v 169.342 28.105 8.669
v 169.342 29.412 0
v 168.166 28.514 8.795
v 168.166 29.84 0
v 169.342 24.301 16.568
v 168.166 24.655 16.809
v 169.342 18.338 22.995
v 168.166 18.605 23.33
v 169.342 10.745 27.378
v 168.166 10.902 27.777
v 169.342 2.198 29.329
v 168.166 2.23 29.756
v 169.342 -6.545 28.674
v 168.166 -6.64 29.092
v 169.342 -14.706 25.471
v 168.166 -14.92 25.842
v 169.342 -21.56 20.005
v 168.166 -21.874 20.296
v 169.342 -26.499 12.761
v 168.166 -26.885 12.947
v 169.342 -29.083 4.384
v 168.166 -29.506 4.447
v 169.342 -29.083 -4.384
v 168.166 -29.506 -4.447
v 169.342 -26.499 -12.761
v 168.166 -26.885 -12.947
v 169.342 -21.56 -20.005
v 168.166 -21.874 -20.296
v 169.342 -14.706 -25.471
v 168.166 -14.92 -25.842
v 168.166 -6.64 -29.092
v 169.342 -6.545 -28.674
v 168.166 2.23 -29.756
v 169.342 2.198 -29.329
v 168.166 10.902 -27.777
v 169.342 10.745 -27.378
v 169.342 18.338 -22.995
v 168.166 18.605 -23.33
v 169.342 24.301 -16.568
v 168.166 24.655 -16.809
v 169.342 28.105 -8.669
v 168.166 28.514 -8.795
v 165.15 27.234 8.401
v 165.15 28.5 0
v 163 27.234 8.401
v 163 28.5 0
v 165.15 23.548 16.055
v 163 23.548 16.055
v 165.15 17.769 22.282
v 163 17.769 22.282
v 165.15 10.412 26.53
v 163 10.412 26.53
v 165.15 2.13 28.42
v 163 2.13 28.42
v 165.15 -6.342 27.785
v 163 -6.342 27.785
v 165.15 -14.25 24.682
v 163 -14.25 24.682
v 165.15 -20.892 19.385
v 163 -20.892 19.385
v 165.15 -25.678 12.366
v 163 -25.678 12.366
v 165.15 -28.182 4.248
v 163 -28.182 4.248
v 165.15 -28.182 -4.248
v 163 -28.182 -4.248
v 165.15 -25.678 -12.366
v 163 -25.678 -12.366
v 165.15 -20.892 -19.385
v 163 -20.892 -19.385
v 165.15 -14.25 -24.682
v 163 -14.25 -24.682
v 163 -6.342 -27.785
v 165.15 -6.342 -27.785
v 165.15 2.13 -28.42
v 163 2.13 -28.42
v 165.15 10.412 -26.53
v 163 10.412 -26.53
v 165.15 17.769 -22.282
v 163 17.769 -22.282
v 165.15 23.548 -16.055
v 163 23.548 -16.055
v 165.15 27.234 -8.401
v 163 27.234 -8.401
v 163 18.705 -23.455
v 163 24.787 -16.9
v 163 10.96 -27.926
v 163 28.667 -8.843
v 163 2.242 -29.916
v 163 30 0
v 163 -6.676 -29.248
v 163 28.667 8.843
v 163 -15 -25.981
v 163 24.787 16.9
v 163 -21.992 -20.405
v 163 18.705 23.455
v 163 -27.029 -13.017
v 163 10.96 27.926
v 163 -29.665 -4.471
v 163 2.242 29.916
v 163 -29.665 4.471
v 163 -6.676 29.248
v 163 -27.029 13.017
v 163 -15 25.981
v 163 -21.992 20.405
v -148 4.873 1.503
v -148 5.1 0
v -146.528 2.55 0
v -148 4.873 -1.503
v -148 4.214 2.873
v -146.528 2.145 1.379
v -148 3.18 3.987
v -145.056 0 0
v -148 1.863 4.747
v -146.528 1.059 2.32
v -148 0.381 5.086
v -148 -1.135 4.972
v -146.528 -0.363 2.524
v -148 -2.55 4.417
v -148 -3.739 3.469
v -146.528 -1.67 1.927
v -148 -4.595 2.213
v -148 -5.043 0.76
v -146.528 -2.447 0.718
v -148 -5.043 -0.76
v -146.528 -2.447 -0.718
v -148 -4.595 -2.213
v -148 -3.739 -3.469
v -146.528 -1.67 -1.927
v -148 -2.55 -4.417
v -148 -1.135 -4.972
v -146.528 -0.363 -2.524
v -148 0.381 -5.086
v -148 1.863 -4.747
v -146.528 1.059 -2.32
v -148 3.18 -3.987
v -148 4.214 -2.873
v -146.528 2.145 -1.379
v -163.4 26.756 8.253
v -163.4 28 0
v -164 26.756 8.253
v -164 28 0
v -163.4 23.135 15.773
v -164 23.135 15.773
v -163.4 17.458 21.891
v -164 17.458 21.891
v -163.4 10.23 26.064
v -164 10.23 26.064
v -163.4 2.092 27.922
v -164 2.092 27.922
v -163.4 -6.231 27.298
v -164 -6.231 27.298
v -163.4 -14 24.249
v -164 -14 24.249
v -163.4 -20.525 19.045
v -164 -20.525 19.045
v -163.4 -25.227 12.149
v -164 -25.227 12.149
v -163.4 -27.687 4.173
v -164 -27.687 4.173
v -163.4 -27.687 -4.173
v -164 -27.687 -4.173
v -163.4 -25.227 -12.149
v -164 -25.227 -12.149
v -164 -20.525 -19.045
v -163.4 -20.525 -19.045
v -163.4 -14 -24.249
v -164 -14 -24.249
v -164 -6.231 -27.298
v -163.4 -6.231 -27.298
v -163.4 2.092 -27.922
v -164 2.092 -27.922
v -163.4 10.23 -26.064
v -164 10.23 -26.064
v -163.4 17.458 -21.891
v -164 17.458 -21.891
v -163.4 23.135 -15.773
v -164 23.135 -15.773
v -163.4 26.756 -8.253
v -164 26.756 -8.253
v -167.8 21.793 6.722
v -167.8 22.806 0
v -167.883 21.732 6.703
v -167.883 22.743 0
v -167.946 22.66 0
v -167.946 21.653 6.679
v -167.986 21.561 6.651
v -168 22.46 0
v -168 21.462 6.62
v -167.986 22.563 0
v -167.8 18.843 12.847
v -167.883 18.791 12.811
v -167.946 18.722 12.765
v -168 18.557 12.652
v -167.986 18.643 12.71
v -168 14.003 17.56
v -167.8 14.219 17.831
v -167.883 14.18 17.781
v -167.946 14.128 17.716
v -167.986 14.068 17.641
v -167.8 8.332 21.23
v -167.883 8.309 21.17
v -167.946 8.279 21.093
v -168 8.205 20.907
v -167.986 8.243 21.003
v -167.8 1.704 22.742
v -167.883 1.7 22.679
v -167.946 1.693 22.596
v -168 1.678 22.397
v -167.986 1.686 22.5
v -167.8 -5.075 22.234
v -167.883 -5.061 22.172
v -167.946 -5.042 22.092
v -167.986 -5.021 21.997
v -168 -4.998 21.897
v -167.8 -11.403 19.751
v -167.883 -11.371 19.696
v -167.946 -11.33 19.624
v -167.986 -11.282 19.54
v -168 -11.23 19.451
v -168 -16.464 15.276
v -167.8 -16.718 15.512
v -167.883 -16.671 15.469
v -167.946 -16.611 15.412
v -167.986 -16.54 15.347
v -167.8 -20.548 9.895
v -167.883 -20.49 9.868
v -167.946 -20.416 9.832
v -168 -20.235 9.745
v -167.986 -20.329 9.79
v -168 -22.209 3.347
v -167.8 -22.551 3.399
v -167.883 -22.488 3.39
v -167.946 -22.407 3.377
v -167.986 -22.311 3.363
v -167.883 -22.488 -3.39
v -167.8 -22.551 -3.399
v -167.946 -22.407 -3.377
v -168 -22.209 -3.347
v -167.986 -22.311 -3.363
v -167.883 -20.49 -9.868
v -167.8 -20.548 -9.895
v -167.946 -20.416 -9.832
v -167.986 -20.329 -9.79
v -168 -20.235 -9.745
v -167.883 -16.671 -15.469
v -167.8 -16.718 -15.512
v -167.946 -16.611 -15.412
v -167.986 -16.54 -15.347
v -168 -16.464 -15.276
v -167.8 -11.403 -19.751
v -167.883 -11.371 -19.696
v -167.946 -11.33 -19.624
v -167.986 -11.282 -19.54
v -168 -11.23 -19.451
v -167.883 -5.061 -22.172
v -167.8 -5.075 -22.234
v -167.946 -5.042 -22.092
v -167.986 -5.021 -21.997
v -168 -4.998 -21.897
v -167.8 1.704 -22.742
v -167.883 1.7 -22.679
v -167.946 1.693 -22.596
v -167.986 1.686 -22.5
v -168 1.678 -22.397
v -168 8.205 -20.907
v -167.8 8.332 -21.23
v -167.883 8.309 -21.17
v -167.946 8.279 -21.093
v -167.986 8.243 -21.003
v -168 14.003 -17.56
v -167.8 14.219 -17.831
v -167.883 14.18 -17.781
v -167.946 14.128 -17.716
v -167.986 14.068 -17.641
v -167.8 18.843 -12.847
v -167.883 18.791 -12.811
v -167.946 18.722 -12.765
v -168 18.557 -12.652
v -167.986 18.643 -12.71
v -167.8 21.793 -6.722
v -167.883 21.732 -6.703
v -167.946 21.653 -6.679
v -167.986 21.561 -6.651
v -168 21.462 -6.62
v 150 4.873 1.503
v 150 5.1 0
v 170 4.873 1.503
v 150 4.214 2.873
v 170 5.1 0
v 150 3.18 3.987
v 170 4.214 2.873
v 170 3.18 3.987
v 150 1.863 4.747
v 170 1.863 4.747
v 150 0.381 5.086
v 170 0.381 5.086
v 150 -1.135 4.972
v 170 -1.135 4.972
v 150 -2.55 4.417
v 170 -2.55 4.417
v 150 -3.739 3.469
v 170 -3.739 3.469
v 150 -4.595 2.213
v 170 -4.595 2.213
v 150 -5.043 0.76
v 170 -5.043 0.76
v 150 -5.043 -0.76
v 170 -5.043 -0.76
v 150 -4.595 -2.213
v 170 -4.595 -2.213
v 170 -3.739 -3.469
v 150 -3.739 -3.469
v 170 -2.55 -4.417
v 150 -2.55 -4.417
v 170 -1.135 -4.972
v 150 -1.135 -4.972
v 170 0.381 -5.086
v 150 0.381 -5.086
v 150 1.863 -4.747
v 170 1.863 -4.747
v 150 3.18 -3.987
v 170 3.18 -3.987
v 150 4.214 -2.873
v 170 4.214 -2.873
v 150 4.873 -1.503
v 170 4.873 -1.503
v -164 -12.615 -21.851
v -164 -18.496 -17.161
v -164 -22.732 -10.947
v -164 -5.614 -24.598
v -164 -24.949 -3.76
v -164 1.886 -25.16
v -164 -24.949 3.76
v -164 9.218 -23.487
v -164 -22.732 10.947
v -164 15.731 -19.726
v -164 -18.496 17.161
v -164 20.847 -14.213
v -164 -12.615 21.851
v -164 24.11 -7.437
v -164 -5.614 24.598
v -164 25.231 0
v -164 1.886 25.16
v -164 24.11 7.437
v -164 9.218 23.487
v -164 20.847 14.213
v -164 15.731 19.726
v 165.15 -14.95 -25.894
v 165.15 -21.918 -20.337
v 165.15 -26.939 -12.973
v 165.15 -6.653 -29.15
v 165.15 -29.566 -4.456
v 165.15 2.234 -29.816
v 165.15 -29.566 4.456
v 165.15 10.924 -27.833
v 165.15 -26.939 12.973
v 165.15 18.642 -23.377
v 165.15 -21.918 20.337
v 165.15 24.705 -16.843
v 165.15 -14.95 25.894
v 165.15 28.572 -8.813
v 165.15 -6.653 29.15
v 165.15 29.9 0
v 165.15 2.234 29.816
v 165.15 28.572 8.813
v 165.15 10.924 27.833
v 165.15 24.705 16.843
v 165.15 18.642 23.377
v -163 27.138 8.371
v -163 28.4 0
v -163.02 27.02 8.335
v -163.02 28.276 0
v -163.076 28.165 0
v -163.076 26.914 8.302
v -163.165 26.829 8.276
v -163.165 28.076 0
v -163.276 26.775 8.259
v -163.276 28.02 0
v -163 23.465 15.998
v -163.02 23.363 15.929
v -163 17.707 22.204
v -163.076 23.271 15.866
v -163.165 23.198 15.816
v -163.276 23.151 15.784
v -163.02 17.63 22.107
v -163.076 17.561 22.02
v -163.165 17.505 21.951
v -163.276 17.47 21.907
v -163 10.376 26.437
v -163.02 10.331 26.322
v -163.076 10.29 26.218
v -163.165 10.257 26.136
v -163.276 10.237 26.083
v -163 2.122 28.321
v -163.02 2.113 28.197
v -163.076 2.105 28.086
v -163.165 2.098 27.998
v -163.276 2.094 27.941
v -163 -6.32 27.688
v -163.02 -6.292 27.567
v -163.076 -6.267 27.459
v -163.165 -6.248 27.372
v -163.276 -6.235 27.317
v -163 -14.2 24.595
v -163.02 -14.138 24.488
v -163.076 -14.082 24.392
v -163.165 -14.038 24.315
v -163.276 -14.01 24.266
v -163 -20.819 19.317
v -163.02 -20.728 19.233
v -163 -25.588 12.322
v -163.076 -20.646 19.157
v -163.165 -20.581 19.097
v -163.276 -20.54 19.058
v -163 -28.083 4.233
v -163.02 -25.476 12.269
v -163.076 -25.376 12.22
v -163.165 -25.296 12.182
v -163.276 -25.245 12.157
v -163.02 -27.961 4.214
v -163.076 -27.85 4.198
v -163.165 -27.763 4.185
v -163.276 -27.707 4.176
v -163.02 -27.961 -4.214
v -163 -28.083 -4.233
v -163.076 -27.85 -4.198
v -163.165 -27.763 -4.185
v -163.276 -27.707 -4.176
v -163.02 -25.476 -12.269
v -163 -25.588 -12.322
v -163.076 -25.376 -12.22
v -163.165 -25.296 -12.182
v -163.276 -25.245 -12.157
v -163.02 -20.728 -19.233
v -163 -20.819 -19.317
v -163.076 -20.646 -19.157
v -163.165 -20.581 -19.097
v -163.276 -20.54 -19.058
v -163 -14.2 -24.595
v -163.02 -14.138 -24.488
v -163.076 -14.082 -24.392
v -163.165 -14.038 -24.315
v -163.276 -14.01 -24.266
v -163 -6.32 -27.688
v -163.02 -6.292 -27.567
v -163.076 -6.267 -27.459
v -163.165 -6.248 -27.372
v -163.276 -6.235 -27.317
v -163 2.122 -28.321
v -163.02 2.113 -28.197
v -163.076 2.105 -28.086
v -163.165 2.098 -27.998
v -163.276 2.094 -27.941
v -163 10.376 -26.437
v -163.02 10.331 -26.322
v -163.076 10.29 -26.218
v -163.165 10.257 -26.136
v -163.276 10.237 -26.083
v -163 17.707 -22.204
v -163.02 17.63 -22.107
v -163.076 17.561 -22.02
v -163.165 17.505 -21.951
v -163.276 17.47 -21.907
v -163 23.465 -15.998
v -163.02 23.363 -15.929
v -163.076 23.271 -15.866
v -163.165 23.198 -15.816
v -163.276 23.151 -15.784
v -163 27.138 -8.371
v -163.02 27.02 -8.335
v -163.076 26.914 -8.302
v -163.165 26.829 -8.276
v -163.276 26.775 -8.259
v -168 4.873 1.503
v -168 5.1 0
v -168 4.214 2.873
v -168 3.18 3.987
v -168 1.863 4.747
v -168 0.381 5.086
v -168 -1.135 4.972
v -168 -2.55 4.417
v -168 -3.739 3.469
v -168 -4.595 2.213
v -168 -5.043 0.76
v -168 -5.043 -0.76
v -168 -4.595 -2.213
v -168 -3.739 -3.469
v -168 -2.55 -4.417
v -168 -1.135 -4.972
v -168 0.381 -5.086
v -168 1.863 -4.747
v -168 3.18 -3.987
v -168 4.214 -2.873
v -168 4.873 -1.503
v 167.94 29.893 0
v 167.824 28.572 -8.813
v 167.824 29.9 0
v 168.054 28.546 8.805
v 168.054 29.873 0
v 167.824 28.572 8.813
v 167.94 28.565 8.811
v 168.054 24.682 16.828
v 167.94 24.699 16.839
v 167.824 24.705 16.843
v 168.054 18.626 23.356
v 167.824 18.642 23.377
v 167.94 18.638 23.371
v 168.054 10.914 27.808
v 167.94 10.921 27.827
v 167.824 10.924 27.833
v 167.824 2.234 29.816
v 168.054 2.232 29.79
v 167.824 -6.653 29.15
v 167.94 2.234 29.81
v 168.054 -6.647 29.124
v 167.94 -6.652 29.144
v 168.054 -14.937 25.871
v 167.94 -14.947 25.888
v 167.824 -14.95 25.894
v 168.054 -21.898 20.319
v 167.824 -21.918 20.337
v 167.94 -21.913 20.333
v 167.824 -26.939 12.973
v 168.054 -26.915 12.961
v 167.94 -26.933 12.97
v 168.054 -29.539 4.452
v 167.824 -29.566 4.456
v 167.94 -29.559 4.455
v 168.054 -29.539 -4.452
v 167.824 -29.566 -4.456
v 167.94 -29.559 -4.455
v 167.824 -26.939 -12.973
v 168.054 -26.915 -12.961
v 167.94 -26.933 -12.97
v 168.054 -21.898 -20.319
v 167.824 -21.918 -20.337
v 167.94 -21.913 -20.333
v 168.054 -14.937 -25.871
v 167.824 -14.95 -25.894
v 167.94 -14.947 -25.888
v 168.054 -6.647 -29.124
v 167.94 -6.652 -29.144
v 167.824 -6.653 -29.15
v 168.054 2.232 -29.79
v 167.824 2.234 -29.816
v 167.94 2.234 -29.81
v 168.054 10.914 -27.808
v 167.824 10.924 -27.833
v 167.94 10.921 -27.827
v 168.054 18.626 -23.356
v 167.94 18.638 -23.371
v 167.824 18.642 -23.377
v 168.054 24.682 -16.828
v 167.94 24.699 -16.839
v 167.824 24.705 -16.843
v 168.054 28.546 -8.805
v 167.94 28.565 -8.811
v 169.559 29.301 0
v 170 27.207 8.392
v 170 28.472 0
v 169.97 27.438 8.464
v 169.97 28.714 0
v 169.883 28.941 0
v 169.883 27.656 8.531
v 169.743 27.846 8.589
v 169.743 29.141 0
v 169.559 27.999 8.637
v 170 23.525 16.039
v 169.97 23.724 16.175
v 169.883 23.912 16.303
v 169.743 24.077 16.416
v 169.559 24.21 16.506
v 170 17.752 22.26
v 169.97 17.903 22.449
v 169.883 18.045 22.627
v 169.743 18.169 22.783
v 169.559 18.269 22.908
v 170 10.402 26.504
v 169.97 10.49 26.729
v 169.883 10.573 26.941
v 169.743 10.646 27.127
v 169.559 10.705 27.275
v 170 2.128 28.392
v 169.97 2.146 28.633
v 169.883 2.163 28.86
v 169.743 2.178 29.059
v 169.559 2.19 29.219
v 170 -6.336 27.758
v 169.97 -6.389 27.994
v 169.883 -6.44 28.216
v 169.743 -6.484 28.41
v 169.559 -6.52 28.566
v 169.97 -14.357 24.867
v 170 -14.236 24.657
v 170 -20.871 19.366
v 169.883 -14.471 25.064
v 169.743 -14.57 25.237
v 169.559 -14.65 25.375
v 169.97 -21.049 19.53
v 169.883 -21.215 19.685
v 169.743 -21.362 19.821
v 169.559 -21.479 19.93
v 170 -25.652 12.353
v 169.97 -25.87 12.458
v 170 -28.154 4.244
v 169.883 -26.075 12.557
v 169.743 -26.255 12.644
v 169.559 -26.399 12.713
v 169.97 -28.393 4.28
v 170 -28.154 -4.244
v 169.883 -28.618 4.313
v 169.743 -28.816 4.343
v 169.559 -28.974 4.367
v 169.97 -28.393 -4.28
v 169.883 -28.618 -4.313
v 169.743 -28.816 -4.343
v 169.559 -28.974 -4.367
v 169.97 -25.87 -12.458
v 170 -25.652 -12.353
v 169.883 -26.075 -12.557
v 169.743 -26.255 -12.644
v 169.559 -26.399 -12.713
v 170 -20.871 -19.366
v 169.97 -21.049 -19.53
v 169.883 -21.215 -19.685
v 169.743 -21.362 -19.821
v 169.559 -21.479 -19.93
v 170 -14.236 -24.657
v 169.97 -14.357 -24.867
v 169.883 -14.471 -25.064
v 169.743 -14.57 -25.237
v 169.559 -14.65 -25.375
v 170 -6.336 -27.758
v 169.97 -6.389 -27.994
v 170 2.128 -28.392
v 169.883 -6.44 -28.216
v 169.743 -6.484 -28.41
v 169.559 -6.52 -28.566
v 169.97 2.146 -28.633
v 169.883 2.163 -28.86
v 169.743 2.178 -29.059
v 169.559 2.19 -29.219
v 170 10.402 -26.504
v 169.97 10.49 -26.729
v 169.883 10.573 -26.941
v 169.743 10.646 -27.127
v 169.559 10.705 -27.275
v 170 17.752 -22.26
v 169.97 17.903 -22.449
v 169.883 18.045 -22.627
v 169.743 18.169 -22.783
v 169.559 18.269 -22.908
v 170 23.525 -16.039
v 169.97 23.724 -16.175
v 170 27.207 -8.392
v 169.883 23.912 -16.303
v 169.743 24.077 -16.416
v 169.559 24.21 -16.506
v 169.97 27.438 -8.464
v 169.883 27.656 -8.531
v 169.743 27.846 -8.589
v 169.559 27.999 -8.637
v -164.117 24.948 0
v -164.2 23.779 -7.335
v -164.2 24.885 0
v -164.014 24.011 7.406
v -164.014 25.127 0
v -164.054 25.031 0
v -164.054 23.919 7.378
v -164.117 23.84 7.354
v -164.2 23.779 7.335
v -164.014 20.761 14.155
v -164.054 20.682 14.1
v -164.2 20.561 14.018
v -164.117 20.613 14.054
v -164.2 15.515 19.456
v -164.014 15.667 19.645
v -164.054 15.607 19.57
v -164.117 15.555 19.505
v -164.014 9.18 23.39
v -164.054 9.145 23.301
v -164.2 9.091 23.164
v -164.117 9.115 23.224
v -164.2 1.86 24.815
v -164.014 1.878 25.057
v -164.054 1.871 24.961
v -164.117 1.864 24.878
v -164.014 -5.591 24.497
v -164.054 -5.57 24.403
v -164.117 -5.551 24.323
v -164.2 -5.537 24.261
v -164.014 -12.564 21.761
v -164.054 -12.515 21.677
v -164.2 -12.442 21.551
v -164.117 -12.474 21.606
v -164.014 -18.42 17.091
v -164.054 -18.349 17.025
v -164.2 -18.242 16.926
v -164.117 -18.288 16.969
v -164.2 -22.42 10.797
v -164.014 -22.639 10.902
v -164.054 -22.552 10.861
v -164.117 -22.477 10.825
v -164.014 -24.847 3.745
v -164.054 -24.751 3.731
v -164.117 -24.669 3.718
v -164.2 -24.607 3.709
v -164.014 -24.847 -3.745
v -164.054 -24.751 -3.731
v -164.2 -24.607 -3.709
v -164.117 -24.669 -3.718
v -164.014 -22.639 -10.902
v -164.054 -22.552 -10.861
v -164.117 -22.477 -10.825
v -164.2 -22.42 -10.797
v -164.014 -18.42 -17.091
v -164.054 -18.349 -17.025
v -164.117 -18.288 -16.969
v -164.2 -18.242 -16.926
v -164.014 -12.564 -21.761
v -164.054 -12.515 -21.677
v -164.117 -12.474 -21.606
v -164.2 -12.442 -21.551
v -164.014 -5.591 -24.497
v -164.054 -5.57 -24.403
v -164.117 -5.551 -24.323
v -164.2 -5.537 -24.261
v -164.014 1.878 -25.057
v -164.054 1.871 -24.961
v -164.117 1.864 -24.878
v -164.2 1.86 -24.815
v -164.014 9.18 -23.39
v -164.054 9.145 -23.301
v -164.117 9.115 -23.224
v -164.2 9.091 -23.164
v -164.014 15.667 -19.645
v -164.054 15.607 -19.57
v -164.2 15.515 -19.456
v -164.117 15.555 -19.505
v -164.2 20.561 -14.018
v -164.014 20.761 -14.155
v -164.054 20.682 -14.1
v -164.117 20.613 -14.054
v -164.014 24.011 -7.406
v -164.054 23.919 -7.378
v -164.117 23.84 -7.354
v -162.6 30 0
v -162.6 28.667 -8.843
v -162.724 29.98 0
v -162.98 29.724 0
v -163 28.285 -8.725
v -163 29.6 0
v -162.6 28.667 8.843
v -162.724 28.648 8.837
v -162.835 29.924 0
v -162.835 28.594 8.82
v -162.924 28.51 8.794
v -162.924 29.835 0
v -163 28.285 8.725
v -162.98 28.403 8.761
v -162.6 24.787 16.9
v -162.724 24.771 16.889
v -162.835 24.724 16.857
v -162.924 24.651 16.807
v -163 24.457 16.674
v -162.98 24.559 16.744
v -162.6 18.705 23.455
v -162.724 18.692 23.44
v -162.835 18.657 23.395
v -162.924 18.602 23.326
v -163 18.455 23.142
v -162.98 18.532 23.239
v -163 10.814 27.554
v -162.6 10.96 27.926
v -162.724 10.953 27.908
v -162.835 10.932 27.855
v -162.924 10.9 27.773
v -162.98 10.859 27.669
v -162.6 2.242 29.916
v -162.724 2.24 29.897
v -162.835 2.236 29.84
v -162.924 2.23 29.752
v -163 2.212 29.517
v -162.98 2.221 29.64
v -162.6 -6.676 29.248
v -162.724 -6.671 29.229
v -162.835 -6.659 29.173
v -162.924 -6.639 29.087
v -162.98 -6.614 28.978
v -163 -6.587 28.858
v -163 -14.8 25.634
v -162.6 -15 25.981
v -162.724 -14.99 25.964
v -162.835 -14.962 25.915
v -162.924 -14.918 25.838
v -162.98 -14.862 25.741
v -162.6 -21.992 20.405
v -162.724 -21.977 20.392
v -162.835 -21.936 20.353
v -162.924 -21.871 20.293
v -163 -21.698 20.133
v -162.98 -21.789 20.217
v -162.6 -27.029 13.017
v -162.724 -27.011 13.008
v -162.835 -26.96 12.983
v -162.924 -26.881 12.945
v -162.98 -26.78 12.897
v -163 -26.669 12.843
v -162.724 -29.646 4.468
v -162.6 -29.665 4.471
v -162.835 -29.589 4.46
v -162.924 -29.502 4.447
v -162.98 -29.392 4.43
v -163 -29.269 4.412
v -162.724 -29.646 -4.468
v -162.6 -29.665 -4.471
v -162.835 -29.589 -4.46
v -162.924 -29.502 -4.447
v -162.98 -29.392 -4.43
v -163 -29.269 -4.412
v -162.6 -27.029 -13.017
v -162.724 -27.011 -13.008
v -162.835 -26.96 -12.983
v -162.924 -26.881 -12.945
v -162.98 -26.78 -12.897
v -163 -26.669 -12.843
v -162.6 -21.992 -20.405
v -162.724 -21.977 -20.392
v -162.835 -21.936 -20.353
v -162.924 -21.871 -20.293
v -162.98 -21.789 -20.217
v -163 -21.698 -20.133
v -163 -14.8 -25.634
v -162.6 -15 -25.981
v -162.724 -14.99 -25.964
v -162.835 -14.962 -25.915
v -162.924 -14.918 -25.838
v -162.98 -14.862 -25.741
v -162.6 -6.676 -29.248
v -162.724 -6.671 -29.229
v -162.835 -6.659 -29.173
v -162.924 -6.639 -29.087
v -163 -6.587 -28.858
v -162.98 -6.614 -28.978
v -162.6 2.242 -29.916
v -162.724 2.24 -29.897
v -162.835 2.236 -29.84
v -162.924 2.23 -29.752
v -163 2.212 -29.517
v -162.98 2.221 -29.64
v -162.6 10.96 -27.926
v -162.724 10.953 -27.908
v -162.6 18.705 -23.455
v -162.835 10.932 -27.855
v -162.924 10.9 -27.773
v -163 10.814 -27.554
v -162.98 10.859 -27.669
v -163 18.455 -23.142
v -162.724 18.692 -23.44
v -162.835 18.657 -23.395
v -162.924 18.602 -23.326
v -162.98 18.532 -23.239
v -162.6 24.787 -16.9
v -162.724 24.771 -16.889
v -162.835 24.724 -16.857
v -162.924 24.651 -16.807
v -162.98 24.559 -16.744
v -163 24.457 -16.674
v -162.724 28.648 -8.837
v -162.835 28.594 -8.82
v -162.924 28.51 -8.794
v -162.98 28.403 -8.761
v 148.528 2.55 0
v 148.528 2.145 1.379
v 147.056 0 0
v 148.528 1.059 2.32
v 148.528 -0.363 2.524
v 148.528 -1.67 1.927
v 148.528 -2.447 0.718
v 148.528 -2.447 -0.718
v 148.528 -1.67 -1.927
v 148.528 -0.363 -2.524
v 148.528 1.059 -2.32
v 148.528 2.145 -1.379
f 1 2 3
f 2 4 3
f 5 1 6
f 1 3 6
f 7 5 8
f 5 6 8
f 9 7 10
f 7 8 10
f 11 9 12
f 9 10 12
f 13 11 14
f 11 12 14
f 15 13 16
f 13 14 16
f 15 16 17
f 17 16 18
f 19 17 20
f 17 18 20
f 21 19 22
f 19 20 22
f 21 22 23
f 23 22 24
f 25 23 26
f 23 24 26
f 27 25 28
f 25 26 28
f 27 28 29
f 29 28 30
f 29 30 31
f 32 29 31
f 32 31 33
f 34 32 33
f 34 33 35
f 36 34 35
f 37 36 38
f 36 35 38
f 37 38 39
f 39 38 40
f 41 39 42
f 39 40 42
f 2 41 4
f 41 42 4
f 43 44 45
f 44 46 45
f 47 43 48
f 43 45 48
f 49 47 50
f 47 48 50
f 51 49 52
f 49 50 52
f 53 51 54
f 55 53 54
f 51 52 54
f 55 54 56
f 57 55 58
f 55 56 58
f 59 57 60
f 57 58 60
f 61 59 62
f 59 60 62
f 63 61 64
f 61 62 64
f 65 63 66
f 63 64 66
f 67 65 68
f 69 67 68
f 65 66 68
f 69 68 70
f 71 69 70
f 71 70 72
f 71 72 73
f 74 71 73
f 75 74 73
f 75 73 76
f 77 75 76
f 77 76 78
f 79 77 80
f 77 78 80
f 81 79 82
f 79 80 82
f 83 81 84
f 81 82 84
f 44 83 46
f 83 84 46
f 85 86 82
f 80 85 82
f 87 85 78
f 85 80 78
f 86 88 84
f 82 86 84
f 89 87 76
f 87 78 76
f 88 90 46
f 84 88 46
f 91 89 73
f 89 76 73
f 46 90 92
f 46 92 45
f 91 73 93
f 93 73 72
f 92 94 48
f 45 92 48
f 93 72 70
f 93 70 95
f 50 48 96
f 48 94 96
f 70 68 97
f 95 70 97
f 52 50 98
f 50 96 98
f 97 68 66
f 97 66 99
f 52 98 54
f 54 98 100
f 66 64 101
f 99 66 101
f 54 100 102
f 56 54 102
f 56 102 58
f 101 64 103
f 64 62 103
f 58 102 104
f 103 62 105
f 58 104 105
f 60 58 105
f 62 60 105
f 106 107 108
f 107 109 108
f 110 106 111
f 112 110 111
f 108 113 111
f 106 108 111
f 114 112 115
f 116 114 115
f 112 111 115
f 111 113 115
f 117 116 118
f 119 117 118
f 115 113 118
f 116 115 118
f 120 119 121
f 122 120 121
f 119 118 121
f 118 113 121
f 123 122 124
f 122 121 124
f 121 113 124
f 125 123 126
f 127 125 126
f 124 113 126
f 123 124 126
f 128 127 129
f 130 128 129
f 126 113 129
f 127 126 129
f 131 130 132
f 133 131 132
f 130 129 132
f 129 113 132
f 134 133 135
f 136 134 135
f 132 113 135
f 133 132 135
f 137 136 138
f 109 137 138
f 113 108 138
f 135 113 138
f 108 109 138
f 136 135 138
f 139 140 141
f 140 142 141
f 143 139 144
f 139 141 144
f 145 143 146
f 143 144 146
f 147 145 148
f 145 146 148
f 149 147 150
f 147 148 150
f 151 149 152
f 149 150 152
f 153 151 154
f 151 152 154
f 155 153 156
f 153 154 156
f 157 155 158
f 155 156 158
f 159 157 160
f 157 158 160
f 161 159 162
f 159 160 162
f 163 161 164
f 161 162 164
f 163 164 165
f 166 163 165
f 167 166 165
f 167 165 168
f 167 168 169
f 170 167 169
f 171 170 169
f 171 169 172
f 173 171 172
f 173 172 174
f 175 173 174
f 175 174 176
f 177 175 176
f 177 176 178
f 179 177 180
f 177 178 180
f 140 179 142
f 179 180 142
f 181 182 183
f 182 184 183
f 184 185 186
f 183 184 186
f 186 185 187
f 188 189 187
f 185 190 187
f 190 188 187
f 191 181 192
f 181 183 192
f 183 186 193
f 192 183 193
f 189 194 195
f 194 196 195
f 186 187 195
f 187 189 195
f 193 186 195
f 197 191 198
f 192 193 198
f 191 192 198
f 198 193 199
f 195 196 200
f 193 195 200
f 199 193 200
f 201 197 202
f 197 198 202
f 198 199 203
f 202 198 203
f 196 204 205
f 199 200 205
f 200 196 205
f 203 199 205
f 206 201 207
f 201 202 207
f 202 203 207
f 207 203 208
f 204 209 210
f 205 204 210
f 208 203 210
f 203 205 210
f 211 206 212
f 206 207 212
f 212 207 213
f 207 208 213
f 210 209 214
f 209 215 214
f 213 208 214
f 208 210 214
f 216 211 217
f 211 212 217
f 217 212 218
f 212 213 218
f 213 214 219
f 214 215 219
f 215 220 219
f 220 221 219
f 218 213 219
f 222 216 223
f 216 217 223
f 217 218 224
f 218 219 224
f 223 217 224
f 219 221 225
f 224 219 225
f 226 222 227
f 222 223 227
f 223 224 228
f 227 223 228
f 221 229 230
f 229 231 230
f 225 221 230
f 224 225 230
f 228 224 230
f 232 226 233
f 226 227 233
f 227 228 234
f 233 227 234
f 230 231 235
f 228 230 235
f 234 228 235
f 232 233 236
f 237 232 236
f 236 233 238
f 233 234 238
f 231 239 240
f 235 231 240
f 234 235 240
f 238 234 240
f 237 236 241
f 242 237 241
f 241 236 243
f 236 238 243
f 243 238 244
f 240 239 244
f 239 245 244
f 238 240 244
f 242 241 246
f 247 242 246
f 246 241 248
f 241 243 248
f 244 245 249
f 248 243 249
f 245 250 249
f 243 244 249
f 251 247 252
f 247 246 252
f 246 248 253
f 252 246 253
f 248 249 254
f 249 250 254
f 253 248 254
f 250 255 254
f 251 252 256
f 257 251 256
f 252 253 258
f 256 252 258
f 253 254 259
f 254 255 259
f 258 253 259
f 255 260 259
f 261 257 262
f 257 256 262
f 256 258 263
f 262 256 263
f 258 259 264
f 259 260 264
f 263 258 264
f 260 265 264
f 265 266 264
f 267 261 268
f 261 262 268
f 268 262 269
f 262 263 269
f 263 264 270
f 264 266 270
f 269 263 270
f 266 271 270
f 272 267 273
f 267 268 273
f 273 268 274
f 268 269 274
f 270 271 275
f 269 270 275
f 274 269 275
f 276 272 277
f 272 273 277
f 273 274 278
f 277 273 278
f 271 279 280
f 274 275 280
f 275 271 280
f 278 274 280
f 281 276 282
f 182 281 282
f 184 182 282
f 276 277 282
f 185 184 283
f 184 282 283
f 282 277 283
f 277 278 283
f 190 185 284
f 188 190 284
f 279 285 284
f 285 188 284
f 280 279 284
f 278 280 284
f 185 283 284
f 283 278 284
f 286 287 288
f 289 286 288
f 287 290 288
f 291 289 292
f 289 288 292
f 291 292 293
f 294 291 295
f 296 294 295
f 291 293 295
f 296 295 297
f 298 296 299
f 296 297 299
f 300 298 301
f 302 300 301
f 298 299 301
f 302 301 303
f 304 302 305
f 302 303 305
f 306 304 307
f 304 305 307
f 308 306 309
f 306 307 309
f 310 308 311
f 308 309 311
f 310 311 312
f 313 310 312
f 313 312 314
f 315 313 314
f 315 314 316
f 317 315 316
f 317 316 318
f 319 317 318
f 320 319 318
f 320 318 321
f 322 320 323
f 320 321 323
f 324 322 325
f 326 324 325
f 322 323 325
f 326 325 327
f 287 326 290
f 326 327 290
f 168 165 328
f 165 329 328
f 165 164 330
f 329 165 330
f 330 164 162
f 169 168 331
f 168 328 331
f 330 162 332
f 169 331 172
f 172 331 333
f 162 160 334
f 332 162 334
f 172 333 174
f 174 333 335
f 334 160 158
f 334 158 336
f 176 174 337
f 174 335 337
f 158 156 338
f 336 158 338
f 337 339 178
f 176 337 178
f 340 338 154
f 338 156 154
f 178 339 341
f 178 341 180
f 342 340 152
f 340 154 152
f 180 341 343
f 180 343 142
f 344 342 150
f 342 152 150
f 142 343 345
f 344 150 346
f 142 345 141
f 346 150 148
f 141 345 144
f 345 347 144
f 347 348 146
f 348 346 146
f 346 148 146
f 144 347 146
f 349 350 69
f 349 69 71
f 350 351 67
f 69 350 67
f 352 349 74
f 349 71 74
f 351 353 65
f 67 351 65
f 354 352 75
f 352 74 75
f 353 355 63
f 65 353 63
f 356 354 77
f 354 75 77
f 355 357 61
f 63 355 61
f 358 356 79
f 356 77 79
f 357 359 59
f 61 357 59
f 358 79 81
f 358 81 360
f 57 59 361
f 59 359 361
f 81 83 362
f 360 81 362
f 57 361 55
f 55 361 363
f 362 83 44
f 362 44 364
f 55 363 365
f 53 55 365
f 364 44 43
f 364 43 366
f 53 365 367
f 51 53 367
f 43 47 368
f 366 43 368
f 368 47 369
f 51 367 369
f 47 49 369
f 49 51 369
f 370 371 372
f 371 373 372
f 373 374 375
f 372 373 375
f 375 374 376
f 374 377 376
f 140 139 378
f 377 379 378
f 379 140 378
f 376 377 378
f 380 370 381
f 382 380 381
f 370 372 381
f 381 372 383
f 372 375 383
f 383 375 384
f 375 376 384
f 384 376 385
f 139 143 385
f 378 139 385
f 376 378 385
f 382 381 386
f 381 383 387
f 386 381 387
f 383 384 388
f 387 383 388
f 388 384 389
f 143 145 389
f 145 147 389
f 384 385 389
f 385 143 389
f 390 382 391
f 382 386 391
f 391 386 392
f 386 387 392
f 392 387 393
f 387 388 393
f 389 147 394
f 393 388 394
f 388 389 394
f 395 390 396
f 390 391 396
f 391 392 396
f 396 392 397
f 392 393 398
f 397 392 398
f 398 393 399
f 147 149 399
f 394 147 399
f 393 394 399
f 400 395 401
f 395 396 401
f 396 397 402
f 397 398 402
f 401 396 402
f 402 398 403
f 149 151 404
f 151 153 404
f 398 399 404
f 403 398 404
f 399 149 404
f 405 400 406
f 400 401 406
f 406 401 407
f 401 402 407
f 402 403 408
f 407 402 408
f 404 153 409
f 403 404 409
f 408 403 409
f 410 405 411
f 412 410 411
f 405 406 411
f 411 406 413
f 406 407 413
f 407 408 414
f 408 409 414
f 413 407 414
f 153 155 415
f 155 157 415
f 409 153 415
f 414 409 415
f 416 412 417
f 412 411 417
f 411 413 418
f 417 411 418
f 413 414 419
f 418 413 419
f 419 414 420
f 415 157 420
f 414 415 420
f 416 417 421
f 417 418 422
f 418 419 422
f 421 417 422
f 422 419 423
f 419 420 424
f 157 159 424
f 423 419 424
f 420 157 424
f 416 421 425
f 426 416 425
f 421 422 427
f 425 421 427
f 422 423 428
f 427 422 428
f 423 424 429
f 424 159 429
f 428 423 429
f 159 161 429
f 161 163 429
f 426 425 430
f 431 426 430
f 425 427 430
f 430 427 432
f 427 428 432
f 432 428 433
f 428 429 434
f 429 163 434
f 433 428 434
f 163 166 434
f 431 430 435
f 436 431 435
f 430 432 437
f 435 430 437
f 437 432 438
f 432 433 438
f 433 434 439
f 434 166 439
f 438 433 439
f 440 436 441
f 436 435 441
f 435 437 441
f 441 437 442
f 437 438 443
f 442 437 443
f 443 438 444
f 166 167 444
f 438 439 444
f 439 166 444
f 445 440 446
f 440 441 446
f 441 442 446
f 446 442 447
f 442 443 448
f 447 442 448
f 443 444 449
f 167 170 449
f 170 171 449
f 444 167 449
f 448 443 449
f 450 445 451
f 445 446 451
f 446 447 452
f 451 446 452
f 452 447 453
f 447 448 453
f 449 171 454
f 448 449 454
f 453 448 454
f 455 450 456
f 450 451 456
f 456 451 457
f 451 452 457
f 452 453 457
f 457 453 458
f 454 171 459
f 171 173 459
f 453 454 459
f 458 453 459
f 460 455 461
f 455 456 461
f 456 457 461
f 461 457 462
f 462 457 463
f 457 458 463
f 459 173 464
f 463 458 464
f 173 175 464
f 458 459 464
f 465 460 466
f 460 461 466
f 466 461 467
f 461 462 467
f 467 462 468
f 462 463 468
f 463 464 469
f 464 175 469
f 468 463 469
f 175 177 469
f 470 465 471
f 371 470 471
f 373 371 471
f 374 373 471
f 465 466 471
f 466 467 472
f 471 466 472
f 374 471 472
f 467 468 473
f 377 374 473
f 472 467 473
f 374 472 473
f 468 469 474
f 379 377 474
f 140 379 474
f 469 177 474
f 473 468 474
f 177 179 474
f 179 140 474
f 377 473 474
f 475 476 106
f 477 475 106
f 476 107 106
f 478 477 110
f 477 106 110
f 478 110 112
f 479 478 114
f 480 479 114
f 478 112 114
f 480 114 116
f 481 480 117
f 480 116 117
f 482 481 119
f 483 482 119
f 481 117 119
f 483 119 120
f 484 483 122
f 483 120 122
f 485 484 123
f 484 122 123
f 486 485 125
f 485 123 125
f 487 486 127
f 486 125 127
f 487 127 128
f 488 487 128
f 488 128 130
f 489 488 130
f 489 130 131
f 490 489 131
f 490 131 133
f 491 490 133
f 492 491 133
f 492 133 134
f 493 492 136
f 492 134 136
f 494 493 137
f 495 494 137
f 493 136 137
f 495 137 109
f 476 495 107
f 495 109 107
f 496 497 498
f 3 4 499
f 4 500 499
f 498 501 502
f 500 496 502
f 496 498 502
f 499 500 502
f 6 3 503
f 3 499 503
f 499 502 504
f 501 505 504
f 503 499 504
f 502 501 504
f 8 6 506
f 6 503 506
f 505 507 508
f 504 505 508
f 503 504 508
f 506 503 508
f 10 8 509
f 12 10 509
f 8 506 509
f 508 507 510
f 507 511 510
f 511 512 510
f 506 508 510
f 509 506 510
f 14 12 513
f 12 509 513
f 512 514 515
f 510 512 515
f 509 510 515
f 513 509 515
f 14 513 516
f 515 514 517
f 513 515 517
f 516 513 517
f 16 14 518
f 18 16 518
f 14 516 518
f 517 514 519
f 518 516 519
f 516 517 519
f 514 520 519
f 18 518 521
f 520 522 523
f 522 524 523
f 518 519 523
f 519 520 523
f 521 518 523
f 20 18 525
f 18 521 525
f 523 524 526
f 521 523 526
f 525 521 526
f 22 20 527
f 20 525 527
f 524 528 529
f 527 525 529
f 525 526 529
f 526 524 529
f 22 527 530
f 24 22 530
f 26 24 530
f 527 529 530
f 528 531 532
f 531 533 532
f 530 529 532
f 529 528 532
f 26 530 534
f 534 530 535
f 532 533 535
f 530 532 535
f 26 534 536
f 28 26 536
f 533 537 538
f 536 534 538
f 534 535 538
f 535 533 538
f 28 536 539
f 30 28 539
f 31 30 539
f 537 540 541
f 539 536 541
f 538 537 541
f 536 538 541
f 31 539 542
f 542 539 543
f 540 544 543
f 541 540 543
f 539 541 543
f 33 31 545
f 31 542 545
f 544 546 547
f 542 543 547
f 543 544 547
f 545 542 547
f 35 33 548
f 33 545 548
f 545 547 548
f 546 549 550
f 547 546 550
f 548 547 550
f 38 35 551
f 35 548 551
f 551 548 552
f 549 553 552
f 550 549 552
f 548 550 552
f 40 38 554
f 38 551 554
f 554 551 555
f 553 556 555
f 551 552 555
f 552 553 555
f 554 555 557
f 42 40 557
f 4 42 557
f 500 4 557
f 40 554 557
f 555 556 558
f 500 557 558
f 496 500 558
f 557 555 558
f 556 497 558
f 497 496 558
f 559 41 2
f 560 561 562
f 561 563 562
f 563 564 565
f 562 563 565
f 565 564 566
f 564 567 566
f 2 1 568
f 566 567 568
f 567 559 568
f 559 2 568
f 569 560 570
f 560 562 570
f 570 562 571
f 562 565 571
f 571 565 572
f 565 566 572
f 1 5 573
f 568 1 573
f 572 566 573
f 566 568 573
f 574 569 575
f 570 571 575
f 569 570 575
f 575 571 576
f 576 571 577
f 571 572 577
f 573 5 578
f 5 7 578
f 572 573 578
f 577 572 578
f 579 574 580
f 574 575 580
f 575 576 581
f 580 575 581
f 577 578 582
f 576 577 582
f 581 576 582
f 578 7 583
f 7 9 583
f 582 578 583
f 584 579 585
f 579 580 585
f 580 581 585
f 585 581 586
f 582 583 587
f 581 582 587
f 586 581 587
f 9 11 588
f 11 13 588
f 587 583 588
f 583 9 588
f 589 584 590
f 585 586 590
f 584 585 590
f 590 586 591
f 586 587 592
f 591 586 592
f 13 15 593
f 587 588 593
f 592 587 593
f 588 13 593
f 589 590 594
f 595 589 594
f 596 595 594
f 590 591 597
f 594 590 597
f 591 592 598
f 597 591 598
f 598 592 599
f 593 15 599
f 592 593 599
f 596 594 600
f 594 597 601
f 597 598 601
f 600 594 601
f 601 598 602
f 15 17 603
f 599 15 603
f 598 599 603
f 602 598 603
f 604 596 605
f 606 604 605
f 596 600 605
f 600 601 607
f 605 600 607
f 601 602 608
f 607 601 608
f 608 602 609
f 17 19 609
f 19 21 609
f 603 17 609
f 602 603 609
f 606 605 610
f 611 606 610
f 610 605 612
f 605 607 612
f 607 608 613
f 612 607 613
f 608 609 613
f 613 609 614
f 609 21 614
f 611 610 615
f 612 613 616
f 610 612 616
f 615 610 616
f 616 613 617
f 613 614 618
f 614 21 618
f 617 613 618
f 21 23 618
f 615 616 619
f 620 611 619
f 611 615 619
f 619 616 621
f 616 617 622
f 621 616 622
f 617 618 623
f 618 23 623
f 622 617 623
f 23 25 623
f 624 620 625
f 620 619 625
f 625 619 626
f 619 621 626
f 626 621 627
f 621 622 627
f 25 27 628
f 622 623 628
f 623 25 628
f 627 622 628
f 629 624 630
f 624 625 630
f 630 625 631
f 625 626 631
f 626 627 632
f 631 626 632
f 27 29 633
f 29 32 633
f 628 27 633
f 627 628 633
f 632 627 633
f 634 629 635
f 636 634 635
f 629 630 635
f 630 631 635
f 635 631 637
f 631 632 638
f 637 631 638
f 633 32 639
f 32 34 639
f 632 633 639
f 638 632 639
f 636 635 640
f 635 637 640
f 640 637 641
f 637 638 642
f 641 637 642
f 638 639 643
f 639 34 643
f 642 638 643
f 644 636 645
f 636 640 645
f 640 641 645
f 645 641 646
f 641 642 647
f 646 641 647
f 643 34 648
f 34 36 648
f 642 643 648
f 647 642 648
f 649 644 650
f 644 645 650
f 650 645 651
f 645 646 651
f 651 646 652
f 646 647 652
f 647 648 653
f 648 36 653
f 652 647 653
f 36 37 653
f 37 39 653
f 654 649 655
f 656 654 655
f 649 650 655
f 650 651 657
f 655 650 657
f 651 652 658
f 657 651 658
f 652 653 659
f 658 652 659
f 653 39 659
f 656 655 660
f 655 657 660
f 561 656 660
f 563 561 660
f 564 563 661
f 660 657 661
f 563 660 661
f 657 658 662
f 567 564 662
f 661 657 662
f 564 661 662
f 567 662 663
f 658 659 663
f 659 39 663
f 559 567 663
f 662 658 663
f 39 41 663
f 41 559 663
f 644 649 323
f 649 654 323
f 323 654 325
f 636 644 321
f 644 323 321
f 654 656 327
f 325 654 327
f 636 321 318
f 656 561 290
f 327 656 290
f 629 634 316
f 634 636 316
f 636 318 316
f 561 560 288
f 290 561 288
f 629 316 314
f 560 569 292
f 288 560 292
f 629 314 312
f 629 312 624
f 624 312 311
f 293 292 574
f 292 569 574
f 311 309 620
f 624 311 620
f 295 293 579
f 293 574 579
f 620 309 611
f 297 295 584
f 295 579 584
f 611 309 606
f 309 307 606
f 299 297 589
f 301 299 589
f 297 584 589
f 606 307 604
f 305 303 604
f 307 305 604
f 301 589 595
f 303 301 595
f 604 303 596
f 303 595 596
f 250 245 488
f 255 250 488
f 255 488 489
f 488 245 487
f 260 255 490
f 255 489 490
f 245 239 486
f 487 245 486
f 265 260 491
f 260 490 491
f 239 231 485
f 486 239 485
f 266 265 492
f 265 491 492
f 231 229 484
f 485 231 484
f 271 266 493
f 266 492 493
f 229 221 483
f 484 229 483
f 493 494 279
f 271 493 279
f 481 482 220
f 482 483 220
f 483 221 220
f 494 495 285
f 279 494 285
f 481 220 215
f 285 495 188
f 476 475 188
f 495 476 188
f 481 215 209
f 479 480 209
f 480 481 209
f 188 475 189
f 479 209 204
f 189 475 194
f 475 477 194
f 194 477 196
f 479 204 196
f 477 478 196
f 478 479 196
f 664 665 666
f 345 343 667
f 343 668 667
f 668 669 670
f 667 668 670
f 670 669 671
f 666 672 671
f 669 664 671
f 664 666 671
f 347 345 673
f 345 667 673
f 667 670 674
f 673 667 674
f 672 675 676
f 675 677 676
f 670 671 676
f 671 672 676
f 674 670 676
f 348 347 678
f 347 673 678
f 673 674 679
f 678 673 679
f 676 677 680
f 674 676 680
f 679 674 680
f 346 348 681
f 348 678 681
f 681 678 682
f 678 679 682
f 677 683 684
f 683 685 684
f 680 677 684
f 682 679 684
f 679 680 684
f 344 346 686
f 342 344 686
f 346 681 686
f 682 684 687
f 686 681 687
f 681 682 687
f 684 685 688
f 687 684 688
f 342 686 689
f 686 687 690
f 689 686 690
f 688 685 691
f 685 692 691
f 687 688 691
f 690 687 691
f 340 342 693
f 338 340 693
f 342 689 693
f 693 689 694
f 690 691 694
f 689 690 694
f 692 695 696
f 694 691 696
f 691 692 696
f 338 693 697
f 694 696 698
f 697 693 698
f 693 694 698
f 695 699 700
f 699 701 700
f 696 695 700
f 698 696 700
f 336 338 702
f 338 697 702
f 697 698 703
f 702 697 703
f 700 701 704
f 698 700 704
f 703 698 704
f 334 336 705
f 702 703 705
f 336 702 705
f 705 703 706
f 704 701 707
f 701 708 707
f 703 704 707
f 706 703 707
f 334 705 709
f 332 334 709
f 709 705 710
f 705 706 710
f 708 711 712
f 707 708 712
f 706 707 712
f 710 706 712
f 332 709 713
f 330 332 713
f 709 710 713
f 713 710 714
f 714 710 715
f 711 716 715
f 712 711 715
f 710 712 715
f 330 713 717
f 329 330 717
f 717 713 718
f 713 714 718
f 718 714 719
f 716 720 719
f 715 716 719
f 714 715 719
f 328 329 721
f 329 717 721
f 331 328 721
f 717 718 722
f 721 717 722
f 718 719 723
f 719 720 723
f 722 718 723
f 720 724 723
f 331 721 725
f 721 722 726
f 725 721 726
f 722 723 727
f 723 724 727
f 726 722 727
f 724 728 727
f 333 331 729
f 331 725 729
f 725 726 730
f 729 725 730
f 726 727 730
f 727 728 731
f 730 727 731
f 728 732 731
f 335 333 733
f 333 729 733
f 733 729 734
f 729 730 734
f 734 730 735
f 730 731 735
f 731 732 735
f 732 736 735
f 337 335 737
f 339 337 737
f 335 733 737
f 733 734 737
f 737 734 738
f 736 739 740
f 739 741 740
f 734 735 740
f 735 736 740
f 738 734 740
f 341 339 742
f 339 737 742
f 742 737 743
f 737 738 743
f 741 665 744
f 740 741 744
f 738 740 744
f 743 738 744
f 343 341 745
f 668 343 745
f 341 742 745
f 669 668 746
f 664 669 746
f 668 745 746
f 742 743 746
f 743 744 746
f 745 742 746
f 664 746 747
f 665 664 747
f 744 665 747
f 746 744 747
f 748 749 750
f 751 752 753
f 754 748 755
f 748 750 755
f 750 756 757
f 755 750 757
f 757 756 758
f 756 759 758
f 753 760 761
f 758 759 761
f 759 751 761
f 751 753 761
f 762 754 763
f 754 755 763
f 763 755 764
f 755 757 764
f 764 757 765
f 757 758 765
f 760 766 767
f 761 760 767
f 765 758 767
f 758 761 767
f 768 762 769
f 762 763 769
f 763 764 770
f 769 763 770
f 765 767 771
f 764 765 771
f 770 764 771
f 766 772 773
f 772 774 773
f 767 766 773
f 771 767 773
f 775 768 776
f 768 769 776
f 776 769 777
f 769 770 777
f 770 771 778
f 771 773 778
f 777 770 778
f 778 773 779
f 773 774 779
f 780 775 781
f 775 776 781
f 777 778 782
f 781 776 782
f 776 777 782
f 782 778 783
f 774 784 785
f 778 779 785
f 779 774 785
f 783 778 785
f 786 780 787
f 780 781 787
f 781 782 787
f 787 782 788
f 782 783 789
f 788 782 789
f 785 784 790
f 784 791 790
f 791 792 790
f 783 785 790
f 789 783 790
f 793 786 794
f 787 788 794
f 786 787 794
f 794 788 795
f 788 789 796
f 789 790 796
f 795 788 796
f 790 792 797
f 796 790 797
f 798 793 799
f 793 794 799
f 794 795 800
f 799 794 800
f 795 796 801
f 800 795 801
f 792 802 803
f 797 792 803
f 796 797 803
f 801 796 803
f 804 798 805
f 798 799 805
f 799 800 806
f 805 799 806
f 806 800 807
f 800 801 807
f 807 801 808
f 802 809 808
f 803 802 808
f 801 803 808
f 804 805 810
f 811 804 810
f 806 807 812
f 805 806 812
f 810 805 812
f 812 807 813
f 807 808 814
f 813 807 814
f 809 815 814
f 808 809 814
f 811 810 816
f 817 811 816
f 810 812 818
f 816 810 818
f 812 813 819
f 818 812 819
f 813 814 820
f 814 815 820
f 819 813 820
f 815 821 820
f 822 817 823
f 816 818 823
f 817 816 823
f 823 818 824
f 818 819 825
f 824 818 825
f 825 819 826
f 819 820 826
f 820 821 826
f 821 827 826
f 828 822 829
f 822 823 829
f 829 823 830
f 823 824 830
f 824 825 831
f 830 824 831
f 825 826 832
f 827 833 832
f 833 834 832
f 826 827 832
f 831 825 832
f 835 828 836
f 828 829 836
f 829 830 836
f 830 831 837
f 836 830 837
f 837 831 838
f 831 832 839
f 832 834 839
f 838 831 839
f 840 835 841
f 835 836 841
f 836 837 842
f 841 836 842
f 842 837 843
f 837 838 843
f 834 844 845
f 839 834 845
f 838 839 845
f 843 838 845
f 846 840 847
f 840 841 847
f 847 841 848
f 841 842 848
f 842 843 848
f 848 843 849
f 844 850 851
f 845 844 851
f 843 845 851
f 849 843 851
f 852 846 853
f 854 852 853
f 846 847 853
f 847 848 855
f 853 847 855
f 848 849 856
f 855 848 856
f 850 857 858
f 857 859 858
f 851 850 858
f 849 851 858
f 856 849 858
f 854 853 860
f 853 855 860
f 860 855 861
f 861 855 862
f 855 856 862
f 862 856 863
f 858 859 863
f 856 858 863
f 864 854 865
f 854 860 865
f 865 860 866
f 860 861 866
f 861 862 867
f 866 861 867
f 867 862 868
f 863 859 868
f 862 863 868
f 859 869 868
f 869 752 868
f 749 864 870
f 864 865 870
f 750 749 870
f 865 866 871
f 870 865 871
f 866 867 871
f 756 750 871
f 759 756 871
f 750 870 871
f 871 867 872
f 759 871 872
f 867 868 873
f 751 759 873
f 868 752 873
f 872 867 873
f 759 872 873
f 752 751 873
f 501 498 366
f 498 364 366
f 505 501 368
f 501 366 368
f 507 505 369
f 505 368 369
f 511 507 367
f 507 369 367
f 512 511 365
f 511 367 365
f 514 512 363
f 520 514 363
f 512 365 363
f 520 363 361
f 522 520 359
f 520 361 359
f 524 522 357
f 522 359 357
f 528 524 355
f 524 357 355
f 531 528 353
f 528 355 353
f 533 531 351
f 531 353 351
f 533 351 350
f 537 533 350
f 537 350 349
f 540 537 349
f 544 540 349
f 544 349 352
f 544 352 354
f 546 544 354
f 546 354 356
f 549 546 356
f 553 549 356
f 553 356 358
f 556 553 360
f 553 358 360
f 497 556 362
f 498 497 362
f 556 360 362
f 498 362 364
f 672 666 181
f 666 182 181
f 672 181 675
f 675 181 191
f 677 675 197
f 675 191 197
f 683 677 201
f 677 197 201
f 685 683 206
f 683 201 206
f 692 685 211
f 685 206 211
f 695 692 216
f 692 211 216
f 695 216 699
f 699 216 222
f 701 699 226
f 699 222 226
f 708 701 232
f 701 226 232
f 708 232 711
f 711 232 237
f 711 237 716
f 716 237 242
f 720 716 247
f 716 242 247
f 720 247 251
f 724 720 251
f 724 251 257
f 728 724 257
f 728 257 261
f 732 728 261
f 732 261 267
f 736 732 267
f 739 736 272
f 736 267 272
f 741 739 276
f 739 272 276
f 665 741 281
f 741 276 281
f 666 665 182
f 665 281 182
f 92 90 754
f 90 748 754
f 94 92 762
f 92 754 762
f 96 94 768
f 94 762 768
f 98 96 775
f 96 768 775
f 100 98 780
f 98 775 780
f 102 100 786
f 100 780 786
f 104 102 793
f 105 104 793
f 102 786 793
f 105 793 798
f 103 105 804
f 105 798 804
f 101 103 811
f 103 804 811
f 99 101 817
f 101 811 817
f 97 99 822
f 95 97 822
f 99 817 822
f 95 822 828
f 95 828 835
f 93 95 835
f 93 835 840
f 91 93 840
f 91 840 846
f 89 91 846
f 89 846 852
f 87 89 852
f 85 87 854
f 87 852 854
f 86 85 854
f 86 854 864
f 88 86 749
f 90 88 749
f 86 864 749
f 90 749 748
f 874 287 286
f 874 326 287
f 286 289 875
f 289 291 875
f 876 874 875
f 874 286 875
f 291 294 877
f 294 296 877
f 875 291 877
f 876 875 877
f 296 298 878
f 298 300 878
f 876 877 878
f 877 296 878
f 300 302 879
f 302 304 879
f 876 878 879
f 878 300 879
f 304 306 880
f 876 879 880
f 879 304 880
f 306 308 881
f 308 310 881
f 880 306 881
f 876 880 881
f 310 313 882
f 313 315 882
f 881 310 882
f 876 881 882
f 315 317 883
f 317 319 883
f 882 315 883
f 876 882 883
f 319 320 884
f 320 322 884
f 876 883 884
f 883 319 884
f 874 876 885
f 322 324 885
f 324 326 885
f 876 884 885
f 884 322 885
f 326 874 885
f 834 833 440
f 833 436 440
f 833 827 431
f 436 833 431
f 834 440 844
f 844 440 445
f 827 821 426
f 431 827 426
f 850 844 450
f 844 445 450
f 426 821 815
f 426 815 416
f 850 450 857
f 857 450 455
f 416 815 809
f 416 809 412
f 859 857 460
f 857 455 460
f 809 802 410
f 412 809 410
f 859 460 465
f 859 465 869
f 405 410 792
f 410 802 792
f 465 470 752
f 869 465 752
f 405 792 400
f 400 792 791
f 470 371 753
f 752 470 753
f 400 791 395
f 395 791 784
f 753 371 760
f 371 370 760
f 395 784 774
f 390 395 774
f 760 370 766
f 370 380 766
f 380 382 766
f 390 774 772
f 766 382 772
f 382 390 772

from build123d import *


with BuildPart() as part:
    # Sketch1 → Base-Revolve (revolve)
    with BuildSketch(Plane.XY):
        with BuildLine():
            Line((163, 30), (0, 30))
            Line((0, 30), (-162.6, 30))
            ThreePointArc((-162.6, 30), (-162.882842712, 29.882842712), (-163, 29.6))
            Line((-163, 29.6), (-163, 28.4))
            ThreePointArc((-163, 28.4), (-163.117157288, 28.117157288), (-163.4, 28))
            Line((-163.4, 28), (-164, 28))
            Line((-164, 28), (-164, 25.230940108))
            ThreePointArc((-164, 25.230940108), (-164.053589838, 25.030940108), (-164.2, 24.884529946))
            Line((-164.2, 24.884529946), (-167.8, 22.806068977))
            ThreePointArc((-167.8, 22.806068977), (-167.946410162, 22.659658816), (-168, 22.459658816))
            Line((-168, 22.459658816), (-168, 5.1))
            Line((-168, 5.1), (-148, 5.1))
            Line((-148, 5.1), (-145.055513627, 0))
            Line((-145.055513627, 0), (147.055513627, 0))
            Line((147.055513627, 0), (150, 5.1))
            Line((150, 5.1), (170, 5.1))
            Line((170, 5.1), (170, 28.471851993))
            ThreePointArc((170, 28.471851993), (169.819152044, 29.04542843), (169.342020143, 29.411544614))
            Line((169.342020143, 29.411544614), (168.165693163, 29.839692621))
            ThreePointArc((168.165693163, 29.839692621), (167.997321197, 29.884807753), (167.823673019, 29.9))
            Line((167.823673019, 29.9), (165.15, 29.9))
            Line((165.15, 29.9), (165.15, 28.5))
            Line((165.15, 28.5), (163, 28.5))
            Line((163, 28.5), (163, 30))
        make_face()
    revolve(axis=Axis((-168, 0, 0), (1, 0, 0)))


solid = part.part
